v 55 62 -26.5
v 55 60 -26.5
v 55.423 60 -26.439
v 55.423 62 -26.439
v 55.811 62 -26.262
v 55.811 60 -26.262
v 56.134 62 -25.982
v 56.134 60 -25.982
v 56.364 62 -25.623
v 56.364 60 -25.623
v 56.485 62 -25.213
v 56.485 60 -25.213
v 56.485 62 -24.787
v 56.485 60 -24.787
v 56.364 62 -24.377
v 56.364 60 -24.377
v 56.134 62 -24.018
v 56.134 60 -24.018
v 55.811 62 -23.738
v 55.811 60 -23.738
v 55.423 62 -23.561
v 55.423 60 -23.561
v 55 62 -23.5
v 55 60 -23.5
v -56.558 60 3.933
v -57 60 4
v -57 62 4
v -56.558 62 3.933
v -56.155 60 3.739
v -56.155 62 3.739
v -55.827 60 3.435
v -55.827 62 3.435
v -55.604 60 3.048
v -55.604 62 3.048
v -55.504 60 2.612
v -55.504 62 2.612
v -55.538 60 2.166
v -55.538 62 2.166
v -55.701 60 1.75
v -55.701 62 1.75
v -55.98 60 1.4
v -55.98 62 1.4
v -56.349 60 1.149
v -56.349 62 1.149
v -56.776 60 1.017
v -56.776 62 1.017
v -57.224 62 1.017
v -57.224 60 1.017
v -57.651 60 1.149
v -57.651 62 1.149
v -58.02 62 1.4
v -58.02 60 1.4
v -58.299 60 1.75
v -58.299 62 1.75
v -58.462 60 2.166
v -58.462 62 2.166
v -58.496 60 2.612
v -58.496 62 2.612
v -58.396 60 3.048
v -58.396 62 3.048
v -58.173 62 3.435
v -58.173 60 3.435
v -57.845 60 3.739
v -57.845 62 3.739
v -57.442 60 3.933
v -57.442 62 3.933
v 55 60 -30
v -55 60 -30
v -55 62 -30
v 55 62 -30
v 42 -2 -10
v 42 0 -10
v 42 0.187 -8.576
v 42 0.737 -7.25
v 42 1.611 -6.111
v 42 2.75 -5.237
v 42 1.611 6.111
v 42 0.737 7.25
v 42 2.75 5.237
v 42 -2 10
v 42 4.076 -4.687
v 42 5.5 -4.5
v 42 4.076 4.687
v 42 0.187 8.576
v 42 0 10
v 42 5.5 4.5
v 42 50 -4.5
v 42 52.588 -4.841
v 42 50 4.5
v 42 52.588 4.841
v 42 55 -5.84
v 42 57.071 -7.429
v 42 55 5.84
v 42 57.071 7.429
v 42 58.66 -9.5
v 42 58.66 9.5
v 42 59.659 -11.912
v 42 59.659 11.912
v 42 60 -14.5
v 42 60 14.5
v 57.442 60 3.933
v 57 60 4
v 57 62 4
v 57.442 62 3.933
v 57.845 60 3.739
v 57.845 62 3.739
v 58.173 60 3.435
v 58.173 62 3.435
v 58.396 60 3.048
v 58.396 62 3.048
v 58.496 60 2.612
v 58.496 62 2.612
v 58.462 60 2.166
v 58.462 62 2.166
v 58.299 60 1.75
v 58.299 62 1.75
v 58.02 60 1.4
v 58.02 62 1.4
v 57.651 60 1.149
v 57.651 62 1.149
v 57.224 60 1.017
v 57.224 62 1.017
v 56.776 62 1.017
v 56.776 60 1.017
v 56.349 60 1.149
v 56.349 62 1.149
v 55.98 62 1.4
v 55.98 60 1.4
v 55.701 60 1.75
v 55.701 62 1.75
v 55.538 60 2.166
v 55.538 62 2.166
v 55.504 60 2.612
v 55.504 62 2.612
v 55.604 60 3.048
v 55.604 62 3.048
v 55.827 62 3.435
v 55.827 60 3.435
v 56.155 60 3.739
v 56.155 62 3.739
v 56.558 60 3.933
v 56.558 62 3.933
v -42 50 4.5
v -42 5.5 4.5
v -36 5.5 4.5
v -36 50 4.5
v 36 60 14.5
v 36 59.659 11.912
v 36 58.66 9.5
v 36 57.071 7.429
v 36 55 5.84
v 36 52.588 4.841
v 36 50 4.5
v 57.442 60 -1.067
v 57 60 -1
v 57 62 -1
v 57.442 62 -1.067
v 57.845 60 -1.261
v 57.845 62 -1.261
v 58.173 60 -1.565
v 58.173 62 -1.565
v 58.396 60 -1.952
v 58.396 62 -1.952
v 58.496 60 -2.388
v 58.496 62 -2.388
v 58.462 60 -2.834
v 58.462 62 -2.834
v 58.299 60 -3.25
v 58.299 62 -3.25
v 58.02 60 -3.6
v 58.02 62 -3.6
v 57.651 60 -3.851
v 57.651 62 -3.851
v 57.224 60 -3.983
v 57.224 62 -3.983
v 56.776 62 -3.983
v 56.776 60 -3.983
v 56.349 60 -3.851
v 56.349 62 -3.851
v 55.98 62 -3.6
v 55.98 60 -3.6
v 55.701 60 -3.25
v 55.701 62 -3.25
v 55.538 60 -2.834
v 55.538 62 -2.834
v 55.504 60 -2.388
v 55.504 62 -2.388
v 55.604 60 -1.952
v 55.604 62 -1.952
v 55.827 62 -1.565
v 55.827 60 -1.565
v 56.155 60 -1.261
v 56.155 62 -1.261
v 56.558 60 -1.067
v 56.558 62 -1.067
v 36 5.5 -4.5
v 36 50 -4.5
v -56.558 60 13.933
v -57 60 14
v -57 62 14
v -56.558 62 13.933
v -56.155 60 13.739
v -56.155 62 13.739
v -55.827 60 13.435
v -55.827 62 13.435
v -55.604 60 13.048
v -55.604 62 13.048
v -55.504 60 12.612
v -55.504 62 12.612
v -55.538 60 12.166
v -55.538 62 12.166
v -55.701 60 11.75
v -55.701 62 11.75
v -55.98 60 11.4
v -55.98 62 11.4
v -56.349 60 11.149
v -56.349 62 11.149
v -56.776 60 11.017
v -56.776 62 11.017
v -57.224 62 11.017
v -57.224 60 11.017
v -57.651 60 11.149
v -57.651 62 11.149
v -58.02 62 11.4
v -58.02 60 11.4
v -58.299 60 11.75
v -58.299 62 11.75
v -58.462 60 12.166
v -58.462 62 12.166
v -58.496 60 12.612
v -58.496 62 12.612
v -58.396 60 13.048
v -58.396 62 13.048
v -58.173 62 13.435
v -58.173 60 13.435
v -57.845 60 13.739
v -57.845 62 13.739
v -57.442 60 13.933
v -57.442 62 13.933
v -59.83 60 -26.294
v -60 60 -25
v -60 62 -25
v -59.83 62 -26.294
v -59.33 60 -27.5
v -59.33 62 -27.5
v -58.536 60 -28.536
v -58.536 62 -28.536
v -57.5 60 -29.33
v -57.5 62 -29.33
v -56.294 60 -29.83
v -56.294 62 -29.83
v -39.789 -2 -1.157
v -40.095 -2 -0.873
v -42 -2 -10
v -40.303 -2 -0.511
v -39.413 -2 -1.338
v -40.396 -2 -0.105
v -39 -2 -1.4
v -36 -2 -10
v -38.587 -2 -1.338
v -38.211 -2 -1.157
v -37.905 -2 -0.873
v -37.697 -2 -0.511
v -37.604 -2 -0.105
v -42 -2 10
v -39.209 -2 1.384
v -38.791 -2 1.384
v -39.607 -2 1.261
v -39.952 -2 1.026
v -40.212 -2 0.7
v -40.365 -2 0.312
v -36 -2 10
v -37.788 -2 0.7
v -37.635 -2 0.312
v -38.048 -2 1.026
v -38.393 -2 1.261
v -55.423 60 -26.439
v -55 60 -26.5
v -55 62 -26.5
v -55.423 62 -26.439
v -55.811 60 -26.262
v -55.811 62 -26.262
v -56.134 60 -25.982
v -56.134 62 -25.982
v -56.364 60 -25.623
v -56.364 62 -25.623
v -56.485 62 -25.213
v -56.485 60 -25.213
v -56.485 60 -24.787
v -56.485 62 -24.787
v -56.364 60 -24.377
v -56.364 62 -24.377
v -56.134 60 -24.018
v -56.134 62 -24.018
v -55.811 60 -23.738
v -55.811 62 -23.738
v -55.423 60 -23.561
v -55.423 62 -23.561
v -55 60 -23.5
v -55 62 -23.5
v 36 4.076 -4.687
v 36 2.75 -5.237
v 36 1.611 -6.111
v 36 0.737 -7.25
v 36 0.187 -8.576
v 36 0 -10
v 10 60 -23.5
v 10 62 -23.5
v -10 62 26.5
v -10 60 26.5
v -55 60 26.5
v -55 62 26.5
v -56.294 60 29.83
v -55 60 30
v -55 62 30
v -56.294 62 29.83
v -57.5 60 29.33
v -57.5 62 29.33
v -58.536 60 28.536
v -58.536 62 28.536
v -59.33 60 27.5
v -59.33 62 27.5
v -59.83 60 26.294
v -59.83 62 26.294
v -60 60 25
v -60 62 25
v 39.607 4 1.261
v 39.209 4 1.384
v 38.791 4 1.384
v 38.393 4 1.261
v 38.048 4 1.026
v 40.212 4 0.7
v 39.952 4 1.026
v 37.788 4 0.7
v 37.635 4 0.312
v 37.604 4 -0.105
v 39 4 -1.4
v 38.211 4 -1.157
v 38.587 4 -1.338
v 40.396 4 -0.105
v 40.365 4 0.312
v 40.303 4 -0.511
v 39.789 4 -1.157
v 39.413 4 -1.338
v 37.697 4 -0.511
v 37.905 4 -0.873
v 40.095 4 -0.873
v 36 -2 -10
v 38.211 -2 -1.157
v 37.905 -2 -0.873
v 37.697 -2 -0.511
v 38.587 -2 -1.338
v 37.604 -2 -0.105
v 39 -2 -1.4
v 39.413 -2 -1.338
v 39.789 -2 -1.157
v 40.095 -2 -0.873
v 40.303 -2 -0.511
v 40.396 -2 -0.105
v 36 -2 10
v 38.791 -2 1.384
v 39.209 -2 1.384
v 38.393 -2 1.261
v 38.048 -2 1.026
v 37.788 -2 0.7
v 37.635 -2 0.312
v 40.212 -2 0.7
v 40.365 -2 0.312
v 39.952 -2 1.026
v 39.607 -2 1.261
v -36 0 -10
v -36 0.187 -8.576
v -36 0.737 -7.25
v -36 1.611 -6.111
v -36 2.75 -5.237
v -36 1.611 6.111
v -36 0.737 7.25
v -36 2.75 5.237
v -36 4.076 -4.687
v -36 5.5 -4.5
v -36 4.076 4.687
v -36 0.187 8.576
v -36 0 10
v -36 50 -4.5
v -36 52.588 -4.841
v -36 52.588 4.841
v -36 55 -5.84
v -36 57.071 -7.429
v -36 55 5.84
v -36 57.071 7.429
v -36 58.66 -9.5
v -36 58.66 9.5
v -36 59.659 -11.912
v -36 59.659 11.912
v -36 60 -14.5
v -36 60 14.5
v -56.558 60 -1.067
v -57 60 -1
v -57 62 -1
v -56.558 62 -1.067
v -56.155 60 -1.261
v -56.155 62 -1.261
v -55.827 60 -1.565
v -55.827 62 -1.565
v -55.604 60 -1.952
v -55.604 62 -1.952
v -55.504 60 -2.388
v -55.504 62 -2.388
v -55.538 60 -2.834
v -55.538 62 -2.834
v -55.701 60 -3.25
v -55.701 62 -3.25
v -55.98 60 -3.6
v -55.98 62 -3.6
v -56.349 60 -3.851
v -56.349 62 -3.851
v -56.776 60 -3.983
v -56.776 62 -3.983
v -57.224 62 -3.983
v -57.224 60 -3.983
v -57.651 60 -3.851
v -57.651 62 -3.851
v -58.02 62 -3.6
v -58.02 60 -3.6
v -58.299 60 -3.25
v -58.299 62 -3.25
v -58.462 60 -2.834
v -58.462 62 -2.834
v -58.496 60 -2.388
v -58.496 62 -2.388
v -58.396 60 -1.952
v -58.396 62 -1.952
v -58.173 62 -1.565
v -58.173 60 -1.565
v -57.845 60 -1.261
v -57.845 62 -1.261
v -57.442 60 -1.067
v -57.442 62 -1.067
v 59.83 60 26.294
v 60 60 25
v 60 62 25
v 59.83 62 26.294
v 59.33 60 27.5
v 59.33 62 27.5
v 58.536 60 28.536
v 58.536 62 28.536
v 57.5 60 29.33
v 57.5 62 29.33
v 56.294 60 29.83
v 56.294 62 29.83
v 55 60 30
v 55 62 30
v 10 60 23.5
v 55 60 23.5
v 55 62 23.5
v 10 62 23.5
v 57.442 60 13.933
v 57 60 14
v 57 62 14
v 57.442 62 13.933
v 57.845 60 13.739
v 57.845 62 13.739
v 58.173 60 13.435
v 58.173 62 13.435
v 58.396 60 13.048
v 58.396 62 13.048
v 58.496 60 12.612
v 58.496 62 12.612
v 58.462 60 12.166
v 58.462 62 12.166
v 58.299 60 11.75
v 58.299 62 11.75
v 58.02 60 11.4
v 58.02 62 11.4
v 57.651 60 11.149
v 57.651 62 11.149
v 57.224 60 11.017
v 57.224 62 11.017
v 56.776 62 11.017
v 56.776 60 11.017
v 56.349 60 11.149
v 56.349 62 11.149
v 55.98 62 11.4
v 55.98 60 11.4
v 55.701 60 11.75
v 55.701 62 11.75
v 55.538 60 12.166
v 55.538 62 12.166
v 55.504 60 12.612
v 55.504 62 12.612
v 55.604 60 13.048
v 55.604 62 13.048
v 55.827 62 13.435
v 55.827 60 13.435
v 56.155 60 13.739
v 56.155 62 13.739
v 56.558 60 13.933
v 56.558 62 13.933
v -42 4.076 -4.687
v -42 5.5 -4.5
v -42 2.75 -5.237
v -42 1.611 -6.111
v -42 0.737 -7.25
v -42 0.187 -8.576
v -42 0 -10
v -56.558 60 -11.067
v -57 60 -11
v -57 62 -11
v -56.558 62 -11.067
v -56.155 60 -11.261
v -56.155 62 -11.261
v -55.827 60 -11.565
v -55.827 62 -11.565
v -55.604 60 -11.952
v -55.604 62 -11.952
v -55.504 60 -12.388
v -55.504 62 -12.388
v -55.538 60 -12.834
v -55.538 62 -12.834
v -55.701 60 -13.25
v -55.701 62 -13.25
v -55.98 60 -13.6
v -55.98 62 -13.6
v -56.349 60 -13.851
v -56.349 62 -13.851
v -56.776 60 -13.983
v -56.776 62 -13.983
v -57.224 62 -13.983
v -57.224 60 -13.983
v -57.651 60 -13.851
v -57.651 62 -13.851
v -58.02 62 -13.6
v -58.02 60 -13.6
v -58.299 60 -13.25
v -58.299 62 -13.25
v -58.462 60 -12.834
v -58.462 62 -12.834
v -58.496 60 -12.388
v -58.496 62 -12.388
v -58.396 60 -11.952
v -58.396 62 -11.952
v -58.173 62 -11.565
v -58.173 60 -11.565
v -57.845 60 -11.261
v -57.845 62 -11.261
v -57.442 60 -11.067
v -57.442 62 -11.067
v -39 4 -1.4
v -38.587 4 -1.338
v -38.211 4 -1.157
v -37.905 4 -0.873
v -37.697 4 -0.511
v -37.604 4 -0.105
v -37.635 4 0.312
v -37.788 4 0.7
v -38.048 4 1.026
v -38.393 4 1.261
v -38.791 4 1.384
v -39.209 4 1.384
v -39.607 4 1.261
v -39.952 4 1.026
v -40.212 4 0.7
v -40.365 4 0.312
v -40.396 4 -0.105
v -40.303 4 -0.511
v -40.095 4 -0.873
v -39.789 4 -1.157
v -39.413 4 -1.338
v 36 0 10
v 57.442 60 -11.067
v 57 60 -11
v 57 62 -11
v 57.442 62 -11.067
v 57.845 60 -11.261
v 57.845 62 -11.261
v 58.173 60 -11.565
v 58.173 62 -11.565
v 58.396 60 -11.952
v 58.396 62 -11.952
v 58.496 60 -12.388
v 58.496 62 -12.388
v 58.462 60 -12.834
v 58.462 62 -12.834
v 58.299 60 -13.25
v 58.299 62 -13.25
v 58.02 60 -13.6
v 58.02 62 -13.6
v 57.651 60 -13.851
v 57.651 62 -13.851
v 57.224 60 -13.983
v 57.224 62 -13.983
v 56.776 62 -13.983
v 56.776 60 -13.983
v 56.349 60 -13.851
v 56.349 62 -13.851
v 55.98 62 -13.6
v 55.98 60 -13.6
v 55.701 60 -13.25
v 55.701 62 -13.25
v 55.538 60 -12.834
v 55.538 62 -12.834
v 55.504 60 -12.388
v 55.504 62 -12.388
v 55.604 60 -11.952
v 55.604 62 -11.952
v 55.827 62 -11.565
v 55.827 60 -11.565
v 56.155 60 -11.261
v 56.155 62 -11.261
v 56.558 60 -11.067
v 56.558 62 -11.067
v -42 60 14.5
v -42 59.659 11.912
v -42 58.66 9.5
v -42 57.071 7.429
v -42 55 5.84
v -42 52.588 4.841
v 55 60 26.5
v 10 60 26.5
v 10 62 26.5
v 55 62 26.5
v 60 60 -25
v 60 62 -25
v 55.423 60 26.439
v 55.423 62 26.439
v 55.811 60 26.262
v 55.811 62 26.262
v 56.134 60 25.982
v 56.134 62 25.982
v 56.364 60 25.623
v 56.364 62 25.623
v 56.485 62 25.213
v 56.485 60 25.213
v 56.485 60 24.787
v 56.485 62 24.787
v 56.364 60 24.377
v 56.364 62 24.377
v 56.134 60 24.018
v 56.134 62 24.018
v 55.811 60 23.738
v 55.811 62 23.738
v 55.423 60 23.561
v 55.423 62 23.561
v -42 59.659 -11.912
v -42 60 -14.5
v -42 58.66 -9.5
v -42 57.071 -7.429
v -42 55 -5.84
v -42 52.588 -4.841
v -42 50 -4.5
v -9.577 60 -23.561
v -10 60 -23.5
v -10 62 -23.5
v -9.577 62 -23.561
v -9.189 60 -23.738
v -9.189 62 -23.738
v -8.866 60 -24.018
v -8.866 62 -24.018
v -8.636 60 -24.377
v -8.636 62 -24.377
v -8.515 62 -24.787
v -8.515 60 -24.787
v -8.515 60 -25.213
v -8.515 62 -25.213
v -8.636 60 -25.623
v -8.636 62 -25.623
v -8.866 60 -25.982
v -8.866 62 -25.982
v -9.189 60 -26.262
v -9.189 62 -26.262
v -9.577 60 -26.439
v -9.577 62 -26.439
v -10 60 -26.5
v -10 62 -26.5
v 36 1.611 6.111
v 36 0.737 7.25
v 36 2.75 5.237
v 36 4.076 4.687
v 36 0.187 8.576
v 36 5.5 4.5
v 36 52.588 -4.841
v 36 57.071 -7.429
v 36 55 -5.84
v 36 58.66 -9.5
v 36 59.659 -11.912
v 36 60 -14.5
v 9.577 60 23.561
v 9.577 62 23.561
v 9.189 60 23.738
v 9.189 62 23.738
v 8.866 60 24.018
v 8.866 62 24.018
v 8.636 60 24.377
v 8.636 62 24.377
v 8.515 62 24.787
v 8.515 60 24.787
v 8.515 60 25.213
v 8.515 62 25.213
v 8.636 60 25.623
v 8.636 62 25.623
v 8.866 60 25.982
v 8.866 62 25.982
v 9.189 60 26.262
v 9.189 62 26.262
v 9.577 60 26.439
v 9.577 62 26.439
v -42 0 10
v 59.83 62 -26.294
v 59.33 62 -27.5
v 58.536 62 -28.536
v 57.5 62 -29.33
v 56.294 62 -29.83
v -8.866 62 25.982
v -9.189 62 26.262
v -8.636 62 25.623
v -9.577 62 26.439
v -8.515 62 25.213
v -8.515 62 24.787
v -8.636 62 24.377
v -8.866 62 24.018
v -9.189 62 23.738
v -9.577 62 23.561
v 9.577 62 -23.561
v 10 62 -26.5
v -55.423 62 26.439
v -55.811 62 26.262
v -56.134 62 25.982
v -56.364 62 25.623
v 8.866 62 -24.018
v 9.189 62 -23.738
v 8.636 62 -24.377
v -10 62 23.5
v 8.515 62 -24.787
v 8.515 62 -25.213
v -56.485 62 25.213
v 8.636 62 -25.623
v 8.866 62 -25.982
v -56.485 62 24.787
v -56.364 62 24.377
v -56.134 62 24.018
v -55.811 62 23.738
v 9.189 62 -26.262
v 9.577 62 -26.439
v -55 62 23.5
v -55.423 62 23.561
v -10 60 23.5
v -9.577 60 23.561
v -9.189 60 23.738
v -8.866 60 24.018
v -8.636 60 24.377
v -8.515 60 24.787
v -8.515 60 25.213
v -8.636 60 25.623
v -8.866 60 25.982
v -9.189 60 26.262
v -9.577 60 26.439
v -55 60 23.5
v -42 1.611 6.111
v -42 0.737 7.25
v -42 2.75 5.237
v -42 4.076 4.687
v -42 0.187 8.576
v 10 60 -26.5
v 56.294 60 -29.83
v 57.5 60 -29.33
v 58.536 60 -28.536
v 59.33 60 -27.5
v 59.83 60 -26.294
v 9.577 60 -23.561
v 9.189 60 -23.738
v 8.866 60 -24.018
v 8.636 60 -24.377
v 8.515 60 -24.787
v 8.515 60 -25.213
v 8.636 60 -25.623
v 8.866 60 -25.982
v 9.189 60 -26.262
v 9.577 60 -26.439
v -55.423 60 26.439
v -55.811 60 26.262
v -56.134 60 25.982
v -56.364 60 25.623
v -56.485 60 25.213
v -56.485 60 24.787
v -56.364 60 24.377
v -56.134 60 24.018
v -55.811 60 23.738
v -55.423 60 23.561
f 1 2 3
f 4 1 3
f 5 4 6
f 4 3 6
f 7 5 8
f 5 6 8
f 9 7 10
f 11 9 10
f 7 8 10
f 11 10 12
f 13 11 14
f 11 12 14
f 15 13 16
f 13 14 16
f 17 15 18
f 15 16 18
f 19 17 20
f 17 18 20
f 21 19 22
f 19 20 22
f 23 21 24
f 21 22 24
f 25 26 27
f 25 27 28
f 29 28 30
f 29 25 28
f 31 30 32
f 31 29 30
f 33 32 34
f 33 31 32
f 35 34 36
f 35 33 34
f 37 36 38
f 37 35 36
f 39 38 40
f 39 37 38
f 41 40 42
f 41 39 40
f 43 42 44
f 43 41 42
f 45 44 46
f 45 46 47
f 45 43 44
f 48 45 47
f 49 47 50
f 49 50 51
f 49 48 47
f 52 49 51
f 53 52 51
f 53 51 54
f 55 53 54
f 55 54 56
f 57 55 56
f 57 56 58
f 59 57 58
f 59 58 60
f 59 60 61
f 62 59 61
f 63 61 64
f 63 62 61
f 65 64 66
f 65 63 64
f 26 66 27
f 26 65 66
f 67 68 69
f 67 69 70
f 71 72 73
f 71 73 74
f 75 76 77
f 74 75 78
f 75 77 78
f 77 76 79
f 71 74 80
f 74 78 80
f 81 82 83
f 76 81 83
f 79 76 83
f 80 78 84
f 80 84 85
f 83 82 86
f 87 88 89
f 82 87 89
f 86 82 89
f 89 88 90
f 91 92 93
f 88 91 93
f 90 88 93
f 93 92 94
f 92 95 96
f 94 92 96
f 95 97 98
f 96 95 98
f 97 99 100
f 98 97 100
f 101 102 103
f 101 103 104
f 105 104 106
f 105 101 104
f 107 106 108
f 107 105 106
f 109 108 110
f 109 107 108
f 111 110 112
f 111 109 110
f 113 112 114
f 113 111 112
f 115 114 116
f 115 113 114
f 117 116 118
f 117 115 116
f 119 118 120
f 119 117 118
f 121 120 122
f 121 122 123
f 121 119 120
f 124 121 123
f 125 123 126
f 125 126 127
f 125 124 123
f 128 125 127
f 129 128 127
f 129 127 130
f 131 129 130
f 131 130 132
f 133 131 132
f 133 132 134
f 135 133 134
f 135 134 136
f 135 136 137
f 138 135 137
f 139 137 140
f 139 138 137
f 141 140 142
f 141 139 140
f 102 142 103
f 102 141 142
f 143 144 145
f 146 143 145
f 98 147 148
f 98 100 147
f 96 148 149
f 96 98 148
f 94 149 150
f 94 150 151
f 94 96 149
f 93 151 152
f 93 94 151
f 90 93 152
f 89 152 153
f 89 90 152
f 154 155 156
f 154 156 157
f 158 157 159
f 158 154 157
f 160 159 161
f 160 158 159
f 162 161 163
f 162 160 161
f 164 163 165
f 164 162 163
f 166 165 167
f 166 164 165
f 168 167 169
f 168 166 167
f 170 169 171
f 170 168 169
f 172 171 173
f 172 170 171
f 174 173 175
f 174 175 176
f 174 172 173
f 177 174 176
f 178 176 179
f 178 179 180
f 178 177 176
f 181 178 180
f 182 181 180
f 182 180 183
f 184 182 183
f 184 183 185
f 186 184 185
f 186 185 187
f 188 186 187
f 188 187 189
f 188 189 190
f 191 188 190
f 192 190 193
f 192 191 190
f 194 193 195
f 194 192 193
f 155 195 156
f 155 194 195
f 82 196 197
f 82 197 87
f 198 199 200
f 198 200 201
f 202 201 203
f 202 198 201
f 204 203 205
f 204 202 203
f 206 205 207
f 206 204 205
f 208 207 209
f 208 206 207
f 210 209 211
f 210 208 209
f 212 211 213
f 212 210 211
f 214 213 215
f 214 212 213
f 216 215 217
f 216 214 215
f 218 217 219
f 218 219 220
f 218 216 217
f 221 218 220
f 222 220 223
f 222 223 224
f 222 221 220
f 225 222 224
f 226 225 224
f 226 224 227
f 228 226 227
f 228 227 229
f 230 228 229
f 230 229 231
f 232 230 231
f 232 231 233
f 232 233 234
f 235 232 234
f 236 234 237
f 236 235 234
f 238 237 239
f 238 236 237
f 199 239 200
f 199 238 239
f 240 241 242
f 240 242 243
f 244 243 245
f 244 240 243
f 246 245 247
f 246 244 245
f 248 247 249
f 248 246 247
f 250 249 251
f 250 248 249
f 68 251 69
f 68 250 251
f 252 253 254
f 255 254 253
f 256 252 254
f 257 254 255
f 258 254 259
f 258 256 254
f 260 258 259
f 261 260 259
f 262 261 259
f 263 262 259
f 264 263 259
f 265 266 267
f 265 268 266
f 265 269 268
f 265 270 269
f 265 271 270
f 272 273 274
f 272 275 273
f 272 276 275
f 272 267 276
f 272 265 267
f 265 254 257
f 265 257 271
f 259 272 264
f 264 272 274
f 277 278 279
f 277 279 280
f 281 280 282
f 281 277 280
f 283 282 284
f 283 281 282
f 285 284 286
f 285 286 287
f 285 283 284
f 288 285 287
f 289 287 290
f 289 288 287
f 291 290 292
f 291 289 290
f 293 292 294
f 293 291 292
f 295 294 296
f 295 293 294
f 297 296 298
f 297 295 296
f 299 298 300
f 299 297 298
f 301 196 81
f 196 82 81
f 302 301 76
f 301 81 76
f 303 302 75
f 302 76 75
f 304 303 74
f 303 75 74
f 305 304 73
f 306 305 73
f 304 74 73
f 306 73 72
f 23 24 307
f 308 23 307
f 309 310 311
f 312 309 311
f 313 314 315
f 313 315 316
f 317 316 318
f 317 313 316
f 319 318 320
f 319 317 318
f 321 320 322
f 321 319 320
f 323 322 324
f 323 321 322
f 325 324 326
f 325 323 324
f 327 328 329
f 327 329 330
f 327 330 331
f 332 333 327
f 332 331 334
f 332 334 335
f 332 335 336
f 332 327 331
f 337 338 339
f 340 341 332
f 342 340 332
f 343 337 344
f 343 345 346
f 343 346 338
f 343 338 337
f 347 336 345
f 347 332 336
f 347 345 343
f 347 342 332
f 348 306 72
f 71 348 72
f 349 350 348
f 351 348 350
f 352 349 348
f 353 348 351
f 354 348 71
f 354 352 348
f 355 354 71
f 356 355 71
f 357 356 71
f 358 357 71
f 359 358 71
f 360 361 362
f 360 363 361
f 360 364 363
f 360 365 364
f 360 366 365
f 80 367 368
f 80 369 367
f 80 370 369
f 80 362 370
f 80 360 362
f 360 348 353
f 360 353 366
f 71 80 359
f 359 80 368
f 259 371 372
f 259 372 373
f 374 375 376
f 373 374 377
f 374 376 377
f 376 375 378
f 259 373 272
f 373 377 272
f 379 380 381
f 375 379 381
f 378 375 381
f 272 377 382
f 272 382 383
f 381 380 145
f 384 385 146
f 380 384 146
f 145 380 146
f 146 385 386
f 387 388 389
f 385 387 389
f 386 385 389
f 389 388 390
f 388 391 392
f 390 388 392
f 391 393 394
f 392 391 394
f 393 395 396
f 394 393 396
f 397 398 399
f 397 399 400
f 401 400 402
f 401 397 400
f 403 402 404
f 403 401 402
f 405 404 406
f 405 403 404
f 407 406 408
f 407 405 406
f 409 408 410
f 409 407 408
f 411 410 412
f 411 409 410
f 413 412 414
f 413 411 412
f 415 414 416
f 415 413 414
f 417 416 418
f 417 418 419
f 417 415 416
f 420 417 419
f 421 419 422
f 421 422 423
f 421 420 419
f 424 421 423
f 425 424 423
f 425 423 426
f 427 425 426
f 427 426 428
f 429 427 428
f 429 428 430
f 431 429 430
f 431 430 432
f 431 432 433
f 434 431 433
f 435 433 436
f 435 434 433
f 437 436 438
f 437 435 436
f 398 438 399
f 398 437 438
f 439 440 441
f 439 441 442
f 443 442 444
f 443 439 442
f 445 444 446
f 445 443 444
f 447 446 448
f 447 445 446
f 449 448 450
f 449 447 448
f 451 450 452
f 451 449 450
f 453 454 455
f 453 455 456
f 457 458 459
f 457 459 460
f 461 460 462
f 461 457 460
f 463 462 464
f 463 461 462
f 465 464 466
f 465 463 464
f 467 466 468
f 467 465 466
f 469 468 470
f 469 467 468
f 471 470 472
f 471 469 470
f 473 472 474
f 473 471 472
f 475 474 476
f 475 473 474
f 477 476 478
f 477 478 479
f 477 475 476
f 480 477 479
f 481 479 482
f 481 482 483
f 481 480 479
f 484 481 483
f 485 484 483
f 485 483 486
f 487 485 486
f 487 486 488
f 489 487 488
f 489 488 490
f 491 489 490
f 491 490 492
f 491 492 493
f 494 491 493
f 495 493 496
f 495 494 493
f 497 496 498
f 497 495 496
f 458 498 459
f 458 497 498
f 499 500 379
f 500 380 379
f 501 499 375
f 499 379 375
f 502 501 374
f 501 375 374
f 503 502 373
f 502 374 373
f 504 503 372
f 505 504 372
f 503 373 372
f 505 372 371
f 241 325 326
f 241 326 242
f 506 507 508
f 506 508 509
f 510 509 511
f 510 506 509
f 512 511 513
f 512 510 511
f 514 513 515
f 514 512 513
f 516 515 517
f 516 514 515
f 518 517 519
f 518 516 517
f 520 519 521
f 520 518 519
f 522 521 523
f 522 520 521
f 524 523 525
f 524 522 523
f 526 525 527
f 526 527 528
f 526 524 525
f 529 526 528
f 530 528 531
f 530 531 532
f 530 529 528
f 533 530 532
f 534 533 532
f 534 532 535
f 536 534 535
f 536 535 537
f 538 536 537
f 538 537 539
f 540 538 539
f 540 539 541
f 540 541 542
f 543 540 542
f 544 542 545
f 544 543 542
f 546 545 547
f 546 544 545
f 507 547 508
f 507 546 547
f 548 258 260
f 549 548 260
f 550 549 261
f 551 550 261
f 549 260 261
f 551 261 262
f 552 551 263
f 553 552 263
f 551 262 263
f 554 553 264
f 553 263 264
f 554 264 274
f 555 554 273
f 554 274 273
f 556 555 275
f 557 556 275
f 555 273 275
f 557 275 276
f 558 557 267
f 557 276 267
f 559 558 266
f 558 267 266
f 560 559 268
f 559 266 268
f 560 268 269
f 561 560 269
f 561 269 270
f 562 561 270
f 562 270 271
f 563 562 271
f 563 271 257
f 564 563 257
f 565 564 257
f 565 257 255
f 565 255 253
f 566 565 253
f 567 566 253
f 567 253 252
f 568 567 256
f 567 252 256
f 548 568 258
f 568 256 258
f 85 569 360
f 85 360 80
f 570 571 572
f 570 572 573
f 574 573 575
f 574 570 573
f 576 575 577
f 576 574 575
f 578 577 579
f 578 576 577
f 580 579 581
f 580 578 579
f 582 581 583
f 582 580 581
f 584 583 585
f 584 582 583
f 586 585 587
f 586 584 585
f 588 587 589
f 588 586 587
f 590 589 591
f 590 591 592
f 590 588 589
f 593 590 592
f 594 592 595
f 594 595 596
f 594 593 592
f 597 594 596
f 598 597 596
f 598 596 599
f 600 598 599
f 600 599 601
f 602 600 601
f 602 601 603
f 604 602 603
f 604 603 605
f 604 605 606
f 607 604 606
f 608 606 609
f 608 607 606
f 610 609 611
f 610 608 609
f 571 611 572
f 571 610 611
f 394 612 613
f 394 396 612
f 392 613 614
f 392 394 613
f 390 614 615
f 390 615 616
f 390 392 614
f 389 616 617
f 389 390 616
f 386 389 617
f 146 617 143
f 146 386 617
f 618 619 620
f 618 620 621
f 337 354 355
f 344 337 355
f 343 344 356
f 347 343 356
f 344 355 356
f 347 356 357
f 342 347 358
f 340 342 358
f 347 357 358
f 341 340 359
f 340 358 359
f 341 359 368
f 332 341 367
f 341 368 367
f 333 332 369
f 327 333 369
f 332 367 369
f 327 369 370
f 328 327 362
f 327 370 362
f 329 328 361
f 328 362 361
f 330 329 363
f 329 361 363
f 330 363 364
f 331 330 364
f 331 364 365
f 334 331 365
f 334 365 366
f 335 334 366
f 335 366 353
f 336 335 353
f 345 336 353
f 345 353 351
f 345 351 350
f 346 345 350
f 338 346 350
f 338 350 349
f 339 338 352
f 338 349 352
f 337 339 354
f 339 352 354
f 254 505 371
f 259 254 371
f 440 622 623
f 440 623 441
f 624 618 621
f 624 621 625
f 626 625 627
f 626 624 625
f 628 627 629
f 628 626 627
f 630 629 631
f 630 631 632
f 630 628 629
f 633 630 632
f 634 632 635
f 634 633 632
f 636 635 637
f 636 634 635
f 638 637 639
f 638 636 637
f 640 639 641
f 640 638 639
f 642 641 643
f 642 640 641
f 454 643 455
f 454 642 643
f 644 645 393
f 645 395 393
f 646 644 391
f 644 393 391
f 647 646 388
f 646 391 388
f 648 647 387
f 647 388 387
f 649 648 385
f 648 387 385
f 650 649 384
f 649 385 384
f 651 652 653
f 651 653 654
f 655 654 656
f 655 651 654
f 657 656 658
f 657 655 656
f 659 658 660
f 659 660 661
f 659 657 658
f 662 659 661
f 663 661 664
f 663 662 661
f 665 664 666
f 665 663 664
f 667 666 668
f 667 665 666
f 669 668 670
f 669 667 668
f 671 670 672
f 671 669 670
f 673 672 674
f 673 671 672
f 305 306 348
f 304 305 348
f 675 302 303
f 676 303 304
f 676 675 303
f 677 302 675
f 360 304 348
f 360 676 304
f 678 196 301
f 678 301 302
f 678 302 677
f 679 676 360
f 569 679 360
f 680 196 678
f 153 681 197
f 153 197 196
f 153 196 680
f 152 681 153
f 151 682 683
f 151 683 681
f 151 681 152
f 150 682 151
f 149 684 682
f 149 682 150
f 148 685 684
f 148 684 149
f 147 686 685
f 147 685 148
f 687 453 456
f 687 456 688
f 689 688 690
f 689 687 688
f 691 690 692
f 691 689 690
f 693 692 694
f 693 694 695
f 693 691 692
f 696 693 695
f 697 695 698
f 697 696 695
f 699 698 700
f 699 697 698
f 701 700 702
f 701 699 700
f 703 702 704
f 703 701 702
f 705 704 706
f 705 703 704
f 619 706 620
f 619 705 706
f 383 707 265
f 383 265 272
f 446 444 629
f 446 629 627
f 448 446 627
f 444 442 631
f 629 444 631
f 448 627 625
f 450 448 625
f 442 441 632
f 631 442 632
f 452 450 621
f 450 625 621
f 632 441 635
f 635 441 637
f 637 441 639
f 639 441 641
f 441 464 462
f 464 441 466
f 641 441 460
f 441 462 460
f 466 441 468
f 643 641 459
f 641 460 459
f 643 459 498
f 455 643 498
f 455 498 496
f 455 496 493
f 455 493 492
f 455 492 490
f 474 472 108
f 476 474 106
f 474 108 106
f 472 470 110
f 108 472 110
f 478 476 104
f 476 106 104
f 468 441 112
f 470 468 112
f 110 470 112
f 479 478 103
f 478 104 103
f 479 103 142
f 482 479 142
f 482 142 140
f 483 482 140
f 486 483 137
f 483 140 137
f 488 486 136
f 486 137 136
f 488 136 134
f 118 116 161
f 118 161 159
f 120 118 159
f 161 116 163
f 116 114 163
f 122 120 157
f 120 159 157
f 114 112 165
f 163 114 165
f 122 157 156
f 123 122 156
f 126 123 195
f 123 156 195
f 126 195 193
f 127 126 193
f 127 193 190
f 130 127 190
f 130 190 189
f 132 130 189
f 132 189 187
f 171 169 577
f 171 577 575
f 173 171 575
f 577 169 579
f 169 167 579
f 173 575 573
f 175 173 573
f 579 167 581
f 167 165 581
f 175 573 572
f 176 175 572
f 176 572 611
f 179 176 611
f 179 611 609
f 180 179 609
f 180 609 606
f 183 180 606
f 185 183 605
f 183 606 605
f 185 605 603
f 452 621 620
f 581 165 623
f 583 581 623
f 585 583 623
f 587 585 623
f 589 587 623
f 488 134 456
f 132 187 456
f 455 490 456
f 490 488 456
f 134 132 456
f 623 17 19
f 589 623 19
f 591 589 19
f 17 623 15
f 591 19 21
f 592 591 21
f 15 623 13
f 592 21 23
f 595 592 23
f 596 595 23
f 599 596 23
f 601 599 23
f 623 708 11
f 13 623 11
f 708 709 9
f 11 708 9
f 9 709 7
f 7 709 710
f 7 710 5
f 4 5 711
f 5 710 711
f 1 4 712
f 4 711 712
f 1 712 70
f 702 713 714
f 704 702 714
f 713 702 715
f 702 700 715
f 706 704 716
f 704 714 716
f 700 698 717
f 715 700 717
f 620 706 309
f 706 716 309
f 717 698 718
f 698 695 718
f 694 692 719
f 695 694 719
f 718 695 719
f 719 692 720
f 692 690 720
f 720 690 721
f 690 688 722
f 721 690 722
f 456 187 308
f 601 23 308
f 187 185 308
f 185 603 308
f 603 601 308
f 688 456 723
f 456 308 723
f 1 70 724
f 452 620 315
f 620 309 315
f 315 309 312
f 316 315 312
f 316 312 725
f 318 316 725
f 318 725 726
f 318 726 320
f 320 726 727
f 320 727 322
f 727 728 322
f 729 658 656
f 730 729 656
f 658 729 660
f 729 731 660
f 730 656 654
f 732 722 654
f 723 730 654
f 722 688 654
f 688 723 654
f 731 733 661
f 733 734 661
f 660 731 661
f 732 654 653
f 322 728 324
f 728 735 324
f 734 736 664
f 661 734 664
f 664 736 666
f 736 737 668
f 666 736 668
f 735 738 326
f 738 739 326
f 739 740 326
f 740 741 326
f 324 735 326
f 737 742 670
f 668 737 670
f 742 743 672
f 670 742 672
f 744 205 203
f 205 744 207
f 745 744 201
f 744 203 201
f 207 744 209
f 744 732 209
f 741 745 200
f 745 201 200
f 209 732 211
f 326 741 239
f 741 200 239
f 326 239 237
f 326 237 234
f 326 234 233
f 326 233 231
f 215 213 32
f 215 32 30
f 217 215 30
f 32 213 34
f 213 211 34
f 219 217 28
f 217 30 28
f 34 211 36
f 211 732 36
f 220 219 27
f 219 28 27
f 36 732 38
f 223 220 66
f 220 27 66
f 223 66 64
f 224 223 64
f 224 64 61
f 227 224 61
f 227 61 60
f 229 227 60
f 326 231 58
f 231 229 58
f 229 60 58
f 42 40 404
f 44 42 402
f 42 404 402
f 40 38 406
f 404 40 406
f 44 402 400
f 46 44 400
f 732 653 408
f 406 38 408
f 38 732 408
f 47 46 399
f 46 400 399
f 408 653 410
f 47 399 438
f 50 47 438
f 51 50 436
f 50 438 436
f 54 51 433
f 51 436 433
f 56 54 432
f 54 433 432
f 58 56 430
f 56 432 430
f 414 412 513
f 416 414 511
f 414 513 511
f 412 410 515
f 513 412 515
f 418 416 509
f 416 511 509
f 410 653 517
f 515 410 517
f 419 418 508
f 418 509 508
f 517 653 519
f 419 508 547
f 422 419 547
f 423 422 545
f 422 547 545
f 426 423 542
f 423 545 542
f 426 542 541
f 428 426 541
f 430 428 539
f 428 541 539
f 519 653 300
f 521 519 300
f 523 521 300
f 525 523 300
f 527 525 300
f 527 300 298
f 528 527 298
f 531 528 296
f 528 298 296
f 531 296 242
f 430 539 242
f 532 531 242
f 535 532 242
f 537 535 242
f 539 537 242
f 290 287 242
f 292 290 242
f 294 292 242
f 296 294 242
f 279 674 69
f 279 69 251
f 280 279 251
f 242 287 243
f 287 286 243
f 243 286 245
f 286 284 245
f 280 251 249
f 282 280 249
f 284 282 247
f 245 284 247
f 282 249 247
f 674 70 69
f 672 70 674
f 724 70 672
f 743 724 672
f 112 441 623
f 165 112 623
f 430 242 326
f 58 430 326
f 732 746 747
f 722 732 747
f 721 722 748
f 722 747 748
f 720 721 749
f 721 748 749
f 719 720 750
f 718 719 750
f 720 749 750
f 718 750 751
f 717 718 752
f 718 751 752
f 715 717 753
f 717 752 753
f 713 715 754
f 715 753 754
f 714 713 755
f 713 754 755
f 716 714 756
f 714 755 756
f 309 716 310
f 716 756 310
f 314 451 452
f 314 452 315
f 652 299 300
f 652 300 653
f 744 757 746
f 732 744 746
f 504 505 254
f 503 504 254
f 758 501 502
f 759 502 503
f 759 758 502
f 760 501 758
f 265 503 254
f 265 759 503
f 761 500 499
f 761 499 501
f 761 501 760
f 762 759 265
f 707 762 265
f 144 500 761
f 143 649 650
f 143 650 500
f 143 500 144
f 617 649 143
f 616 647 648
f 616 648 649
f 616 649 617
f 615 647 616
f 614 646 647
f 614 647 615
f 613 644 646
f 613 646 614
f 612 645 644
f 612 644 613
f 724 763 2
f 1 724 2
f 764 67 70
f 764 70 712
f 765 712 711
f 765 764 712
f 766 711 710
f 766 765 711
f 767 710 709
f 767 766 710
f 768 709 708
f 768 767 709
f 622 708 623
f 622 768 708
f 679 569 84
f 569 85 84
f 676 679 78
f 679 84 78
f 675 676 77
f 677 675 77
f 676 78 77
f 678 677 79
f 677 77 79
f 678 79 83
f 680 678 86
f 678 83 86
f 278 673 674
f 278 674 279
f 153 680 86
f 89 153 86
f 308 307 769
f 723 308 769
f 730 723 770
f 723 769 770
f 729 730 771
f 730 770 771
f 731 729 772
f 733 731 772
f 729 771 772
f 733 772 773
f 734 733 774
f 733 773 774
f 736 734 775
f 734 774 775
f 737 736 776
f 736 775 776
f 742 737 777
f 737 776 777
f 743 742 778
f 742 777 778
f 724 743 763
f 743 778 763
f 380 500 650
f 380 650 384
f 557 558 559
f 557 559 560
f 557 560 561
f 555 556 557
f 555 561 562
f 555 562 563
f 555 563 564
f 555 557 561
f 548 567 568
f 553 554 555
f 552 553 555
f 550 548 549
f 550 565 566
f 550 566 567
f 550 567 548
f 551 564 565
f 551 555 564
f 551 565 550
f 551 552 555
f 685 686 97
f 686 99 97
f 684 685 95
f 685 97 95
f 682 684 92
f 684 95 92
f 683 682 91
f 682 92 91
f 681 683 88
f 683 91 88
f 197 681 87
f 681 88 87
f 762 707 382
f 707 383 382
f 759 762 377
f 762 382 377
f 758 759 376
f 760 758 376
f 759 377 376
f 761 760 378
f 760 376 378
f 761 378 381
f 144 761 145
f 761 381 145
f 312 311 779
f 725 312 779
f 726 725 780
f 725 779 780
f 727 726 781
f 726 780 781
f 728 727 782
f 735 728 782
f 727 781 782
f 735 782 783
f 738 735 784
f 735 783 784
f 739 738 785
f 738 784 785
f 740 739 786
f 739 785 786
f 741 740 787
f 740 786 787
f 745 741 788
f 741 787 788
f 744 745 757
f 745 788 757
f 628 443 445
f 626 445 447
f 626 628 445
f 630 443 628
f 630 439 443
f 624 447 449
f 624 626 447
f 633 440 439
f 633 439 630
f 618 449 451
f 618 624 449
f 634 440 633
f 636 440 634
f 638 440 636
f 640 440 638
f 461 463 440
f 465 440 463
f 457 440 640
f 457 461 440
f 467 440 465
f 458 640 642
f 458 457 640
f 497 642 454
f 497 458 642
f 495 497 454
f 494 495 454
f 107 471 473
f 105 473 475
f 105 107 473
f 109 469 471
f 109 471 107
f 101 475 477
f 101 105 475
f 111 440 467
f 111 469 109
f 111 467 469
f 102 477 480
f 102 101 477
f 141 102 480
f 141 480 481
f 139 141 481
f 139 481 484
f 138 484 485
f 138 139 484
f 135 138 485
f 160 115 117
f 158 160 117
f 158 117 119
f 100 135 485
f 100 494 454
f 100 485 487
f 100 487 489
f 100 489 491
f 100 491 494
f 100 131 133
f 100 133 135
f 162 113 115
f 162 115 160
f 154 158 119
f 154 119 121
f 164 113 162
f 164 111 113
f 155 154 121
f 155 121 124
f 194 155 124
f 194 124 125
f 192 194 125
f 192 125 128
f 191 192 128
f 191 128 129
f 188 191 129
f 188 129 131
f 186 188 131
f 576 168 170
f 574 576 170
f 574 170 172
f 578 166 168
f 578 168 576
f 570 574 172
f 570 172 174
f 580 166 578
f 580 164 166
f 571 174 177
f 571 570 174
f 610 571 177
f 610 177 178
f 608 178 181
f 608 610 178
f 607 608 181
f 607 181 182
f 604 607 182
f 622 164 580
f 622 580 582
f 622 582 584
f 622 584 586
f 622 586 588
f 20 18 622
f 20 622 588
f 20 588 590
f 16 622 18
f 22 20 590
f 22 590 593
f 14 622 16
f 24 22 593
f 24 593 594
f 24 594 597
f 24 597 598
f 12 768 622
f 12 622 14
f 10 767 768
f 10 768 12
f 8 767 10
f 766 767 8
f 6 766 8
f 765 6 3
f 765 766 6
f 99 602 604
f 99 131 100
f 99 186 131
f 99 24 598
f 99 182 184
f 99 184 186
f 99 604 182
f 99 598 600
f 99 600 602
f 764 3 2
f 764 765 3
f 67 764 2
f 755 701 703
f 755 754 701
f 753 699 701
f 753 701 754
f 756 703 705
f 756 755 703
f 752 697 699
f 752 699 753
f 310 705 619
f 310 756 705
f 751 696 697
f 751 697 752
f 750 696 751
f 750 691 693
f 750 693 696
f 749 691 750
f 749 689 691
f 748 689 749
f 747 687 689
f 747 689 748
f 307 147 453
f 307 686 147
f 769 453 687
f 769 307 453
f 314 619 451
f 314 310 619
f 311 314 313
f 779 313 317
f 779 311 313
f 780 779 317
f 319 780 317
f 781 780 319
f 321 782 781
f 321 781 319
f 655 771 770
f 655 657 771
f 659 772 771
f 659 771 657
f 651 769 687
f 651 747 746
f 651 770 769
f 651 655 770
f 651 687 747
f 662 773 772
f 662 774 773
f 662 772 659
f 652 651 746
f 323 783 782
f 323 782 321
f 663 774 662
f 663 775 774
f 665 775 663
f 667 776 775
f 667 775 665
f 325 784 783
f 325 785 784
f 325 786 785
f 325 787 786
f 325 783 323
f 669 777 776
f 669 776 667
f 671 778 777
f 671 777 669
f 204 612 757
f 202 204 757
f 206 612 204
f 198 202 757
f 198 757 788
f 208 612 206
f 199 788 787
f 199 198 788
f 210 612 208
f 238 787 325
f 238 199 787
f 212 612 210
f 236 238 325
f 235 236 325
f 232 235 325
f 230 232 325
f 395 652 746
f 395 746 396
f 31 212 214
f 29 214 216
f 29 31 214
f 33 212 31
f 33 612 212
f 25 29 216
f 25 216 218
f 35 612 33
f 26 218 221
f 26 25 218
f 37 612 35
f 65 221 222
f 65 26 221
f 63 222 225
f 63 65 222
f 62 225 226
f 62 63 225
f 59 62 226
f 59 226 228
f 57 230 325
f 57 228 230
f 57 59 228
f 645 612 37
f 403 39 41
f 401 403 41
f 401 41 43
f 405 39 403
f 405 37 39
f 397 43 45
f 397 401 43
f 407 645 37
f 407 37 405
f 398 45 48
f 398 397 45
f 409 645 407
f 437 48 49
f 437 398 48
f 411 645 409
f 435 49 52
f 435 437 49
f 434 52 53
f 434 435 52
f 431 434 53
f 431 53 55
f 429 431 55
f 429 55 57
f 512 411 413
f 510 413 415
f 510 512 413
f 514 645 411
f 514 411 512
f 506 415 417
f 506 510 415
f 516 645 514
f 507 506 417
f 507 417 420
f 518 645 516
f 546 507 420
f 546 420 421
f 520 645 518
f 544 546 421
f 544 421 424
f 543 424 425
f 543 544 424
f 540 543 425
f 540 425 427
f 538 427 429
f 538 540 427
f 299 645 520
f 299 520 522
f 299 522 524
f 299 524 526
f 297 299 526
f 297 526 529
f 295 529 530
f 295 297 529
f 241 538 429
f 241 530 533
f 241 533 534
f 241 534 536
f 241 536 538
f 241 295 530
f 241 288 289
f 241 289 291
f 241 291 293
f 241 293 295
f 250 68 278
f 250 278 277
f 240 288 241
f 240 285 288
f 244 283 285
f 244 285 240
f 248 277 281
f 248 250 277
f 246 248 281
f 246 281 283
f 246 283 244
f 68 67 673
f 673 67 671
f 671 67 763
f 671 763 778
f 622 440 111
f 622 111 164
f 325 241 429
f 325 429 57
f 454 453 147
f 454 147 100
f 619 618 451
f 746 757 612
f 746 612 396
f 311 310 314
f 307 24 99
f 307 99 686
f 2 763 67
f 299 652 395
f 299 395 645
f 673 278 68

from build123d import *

# Parameters (mm, degrees)
SKETCH1_W             = 6
SKETCH1_H             = 9
BOSS_EXTRUDE1_DEPTH   = 60
BOSS_EXTRUDE1_2_DEPTH = 60
SKETCH2_W             = 6
SKETCH2_H             = 20
BOSS_EXTRUDE2_DEPTH   = 2
SKETCH3_R             = 1.4
CUT_EXTRUDE1_DEPTH    = 6
FILLET1_R             = 5.5
FILLET2_R             = 5.5
SKETCH4_R             = 1.5
BOSS_EXTRUDE4_DEPTH   = 2
FILLET4_R             = 10


with BuildPart() as part:
    # Sketch1 → Boss-Extrude1 (new body)
    with BuildSketch(Plane(origin=(0, 0, 0), x_dir=(1, 0, 0), z_dir=(0, 1, 0))):
        with Locations((39, 0)):
            Rectangle(SKETCH1_W, SKETCH1_H)
    extrude(amount=BOSS_EXTRUDE1_DEPTH)



with BuildPart() as body_2:
    # Sketch1 → Boss-Extrude1 2 (new body)
    with BuildSketch(Plane(origin=(0, 0, 0), x_dir=(1, 0, 0), z_dir=(0, 1, 0))):
        with Locations((-39, 0)):
            Rectangle(SKETCH1_W, SKETCH1_H)
    extrude(amount=BOSS_EXTRUDE1_2_DEPTH)


with BuildPart() as part_1:
    add(part.part)

    add(body_2.part)  # Boss-Extrude2 merges body 2
    # Sketch2 → Boss-Extrude2 (add)
    with BuildSketch(Plane.XZ):
        with Locations((-39, 0)):
            Rectangle(SKETCH2_W, SKETCH2_H)
        with Locations((39, 0)):
            Rectangle(SKETCH2_W, SKETCH2_H)
    extrude(amount=BOSS_EXTRUDE2_DEPTH)

    # Sketch3 → Cut-Extrude1 (cut)
    with BuildSketch(Plane.XZ.offset(2)):
        with Locations(Location((39, 0, 0), (0, 0, 270))):
            Circle(SKETCH3_R)
        with Locations(Location((-39, 0, 0), (0, 0, 270))):
            Circle(SKETCH3_R)
    extrude(amount=-CUT_EXTRUDE1_DEPTH, mode=Mode.SUBTRACT)

    # Fillet1
    fillet1_edges = [part_1.edges().sort_by_distance(p)[0] for p in [
        (-39, 0, -4.5),
        (-39, 0, 4.5),
    ]]
    fillet(fillet1_edges, radius=FILLET1_R - 0.0001)  # a hair under: the kernel refuses the full size

    # Fillet2
    fillet2_edges = [part_1.edges().sort_by_distance(p)[0] for p in [
        (39, 0, -4.5),
        (39, 0, 4.5),
    ]]
    fillet(fillet2_edges, radius=FILLET2_R - 0.0001)  # a hair under: the kernel refuses the full size

    # Sketch4 → Boss-Extrude4 (add)
    with BuildSketch(Plane(origin=(0, 60, 0), x_dir=(1, 0, 0), z_dir=(0, 1, 0))):
        with BuildLine():
            Line((-55, 30), (55, 30))
            ThreePointArc((55, 30), (58.535533906, 28.535533906), (60, 25))
            Line((60, 25), (60, -25))
            ThreePointArc((60, -25), (58.535533906, -28.535533906), (55, -30))
            Line((55, -30), (-55, -30))
            ThreePointArc((-55, -30), (-58.535533906, -28.535533906), (-60, -25))
            Line((-60, -25), (-60, 25))
            ThreePointArc((-60, 25), (-58.535533906, 28.535533906), (-55, 30))
        make_face()
        with Locations(Location((-57, -2.5, 0), (0, 0, 270))):
            Circle(SKETCH4_R, mode=Mode.SUBTRACT)
        with Locations(Location((-57, -12.5, 0), (0, 0, 270))):
            Circle(SKETCH4_R, mode=Mode.SUBTRACT)
        with Locations(Location((57, -12.5, 0), (0, 0, 270))):
            Circle(SKETCH4_R, mode=Mode.SUBTRACT)
        with Locations(Location((57, -2.5, 0), (0, 0, 270))):
            Circle(SKETCH4_R, mode=Mode.SUBTRACT)
        with Locations(Location((57, 2.5, 0), (0, 0, 270))):
            Circle(SKETCH4_R, mode=Mode.SUBTRACT)
        with Locations(Location((57, 12.5, 0), (0, 0, 270))):
            Circle(SKETCH4_R, mode=Mode.SUBTRACT)
        with Locations(Location((-57, 12.5, 0), (0, 0, 270))):
            Circle(SKETCH4_R, mode=Mode.SUBTRACT)
        with Locations(Location((-57, 2.5, 0), (0, 0, 270))):
            Circle(SKETCH4_R, mode=Mode.SUBTRACT)
        with BuildLine():
            Line((55, 23.5), (10, 23.5))
            ThreePointArc((10, 23.5), (8.5, 25), (10, 26.5))
            Line((10, 26.5), (55, 26.5))
            ThreePointArc((55, 26.5), (56.5, 25), (55, 23.5))
        make_face(mode=Mode.SUBTRACT)
        with BuildLine():
            Line((-55, -23.5), (-10, -23.5))
            ThreePointArc((-10, -23.5), (-8.5, -25), (-10, -26.5))
            Line((-10, -26.5), (-55, -26.5))
            ThreePointArc((-55, -26.5), (-56.5, -25), (-55, -23.5))
        make_face(mode=Mode.SUBTRACT)
        with BuildLine():
            Line((-55, 23.5), (-10, 23.5))
            ThreePointArc((-10, 23.5), (-8.5, 25), (-10, 26.5))
            Line((-10, 26.5), (-55, 26.5))
            ThreePointArc((-55, 26.5), (-56.5, 25), (-55, 23.5))
        make_face(mode=Mode.SUBTRACT)
        with BuildLine():
            Line((55, -23.5), (10, -23.5))
            ThreePointArc((10, -23.5), (8.5, -25), (10, -26.5))
            Line((10, -26.5), (55, -26.5))
            ThreePointArc((55, -26.5), (56.5, -25), (55, -23.5))
        make_face(mode=Mode.SUBTRACT)
    extrude(amount=BOSS_EXTRUDE4_DEPTH)

    # Fillet4
    fillet4_edges = [part_1.edges().sort_by_distance(p)[0] for p in [
        (39, 60, 4.5),
        (39, 60, -4.5),
        (-39, 60, -4.5),
        (-39, 60, 4.5),
    ]]
    fillet(fillet4_edges, radius=FILLET4_R)


solid = part_1.part
